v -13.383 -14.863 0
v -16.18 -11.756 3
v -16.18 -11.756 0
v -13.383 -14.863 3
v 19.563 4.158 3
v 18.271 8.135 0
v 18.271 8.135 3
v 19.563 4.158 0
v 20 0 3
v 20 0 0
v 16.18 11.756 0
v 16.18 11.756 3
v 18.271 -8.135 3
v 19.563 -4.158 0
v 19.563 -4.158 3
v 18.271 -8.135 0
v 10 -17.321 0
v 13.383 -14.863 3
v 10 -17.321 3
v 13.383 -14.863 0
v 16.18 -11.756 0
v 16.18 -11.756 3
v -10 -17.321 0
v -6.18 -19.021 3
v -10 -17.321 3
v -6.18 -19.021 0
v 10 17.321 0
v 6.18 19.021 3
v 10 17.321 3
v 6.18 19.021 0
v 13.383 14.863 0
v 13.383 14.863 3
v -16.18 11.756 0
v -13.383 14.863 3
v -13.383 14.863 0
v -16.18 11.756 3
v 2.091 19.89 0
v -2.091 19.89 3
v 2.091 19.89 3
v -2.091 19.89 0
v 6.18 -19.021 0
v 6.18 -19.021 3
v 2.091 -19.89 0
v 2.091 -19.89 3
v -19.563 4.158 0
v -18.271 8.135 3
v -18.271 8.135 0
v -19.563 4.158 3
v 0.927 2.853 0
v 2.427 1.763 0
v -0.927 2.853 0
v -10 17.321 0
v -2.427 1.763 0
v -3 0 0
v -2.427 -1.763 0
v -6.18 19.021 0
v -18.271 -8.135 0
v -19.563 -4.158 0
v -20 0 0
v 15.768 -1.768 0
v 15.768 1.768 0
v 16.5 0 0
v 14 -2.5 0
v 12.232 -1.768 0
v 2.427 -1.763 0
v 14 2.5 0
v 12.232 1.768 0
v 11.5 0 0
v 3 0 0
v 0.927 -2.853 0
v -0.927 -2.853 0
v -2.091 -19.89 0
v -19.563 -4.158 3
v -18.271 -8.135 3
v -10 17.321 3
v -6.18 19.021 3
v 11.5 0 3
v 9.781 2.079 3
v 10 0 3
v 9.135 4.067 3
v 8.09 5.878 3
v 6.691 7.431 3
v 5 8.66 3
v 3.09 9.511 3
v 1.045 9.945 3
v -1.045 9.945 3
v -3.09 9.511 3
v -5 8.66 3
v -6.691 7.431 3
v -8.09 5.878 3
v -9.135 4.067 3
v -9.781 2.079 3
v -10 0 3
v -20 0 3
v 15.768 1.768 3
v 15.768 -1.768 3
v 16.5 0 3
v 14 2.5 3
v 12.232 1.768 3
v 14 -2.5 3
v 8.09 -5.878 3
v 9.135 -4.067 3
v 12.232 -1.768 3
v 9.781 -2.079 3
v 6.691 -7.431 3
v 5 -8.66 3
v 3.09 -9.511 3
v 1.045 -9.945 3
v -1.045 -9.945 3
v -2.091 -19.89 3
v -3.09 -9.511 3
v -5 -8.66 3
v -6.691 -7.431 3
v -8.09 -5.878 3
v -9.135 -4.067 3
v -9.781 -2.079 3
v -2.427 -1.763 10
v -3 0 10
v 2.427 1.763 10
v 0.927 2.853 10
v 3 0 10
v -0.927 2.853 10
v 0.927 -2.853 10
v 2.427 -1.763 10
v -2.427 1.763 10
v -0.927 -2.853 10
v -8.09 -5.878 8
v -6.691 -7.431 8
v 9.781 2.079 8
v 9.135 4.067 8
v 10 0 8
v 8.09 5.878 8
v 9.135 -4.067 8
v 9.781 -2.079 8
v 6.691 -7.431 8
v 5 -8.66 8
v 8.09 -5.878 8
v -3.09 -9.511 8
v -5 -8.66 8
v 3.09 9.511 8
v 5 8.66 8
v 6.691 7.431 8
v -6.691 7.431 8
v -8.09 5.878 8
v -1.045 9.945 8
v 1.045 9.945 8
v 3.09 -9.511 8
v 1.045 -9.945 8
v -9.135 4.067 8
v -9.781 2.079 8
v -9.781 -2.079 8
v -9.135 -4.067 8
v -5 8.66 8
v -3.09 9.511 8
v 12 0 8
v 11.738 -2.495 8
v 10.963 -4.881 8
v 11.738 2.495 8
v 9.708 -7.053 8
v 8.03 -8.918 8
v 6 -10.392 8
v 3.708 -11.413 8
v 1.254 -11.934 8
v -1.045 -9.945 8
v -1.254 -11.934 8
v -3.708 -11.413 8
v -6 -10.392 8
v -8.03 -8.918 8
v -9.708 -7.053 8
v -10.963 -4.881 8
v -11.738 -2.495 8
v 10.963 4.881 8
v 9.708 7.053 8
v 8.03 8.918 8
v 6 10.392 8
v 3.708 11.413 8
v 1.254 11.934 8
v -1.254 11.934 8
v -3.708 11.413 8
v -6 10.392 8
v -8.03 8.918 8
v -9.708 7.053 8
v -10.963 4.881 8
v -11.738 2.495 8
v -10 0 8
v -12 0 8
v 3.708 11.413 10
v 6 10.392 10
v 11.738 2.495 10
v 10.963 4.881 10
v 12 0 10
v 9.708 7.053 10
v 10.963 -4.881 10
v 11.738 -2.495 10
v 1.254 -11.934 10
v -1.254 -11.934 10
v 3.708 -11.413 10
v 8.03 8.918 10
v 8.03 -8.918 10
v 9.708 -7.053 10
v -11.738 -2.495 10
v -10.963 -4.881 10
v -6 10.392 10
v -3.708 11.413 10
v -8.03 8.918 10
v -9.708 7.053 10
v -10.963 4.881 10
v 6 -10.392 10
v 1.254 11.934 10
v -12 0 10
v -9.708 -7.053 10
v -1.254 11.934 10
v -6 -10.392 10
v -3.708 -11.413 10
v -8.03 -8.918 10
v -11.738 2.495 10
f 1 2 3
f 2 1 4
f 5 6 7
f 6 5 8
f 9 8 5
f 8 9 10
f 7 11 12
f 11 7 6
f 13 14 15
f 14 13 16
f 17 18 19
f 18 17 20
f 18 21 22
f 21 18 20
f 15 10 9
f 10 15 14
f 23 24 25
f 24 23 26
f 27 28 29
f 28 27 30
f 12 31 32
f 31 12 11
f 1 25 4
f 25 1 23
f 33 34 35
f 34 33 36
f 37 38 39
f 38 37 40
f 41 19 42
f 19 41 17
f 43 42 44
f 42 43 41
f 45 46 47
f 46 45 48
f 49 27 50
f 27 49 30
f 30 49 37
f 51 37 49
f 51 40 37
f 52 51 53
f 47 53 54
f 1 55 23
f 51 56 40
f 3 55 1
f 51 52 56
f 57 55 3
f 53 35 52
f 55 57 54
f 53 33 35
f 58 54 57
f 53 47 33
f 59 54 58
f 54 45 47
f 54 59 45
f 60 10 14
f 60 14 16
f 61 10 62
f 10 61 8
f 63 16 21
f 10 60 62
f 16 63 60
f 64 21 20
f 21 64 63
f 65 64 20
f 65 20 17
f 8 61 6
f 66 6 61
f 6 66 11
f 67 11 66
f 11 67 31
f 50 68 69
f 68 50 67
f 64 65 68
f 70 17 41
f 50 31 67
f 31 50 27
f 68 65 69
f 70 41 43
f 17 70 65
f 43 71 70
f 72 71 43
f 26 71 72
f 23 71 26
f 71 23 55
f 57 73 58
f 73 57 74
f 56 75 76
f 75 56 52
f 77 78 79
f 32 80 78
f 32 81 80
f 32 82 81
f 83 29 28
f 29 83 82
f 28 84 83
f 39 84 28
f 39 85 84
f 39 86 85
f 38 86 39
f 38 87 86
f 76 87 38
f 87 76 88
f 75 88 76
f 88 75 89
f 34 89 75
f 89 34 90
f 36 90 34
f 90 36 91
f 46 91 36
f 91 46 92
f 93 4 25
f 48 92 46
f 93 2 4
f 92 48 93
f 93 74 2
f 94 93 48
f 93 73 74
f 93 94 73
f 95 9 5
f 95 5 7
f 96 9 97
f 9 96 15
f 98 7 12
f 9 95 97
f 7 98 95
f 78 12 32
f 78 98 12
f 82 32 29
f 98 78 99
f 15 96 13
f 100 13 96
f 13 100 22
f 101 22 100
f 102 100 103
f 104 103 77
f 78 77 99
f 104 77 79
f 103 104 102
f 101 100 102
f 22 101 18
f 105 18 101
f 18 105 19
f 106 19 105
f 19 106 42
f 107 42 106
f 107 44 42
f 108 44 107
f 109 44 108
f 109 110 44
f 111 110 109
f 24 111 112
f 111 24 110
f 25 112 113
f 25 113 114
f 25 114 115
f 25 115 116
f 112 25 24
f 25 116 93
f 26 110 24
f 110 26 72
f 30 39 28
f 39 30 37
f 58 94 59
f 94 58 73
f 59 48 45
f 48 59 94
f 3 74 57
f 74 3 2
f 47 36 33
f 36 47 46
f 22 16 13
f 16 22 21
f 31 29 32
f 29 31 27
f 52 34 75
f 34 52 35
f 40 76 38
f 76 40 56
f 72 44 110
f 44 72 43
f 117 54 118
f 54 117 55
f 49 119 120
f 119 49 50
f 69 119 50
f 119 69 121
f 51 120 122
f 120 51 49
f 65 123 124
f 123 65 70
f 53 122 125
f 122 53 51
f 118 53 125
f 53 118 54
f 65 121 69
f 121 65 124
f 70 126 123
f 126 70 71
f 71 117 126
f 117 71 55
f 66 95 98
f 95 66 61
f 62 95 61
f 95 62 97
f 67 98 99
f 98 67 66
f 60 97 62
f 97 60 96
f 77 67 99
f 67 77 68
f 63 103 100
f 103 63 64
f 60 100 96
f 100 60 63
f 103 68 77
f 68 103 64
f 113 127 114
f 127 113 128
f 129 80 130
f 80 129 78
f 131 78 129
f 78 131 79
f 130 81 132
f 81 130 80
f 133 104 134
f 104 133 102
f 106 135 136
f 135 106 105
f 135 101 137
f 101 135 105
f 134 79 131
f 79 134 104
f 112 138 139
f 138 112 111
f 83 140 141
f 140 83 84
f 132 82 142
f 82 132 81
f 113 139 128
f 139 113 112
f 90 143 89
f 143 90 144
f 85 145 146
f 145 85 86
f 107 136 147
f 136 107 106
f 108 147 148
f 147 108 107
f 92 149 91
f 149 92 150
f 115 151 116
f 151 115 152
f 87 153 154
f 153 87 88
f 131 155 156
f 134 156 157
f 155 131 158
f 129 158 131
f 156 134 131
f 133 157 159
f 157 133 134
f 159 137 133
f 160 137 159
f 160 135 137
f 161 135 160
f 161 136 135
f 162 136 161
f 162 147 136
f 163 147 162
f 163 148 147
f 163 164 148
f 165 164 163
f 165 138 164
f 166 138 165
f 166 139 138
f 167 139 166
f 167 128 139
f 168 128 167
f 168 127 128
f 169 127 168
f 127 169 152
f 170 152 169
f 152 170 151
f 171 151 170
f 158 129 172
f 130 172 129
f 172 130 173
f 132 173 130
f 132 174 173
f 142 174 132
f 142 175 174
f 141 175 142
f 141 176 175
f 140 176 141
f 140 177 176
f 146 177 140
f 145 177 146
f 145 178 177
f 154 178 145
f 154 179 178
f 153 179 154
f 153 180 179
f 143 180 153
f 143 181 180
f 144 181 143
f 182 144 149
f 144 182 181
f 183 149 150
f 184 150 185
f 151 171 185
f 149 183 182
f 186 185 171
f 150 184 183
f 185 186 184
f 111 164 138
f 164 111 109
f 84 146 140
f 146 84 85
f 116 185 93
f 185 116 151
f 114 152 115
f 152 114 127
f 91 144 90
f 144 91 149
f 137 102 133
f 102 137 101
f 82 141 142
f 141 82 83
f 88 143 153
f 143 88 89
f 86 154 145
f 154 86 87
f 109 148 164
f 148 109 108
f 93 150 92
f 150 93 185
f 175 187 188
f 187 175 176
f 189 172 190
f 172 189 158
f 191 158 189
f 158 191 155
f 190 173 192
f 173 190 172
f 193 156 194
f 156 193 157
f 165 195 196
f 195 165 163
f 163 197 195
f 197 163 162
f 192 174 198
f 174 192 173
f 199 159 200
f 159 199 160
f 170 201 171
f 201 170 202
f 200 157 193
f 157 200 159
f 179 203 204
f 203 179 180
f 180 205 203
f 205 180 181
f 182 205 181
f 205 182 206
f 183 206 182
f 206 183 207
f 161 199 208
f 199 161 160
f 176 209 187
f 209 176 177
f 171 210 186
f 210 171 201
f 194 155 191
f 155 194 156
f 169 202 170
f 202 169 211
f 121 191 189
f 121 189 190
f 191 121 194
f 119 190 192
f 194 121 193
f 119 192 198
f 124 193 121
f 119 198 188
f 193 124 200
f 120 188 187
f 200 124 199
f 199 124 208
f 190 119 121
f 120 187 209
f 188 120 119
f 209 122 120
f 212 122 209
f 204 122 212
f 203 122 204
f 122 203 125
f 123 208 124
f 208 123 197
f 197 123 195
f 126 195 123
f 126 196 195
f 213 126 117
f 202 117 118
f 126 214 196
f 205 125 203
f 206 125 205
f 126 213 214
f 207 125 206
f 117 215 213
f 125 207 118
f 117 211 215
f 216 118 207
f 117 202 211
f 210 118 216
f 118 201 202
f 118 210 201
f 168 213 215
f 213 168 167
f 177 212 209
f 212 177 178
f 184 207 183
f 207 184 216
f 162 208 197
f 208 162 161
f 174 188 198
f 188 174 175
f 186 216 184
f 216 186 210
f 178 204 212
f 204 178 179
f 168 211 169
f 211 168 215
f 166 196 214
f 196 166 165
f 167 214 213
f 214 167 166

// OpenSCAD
//wheel

difference(){
	cylinder(h=3, r=20);

	translate([0,0,-2]) cylinder(h=6, r=3);
	translate([14,0,-2]) cylinder(h=6, r=2.5);
}

difference(){
	translate([0,0,3]) cylinder(h=5,r=10);

	cylinder(h=10,r=3);
}

difference(){
	translate([0,0,8]) cylinder(h=2,r=12);

	cylinder(h=14, r=3);
}


//arm
/*
difference(){
	translate([25, 0,0]) cube(size=[15, 75, 3]);

	translate([33,5,-2]) cylinder(h=6, r=2.5);
	translate([33,68,-2]) cylinder(h=6, r=2.5);
}

//clip
translate([37,50,3])
cube(size=[3,10,10]);

translate([25,50,3])
cube(size=[3,10,10]);

//rod
translate([50,0,0]) cube(size=[8,55,10]);
*/
